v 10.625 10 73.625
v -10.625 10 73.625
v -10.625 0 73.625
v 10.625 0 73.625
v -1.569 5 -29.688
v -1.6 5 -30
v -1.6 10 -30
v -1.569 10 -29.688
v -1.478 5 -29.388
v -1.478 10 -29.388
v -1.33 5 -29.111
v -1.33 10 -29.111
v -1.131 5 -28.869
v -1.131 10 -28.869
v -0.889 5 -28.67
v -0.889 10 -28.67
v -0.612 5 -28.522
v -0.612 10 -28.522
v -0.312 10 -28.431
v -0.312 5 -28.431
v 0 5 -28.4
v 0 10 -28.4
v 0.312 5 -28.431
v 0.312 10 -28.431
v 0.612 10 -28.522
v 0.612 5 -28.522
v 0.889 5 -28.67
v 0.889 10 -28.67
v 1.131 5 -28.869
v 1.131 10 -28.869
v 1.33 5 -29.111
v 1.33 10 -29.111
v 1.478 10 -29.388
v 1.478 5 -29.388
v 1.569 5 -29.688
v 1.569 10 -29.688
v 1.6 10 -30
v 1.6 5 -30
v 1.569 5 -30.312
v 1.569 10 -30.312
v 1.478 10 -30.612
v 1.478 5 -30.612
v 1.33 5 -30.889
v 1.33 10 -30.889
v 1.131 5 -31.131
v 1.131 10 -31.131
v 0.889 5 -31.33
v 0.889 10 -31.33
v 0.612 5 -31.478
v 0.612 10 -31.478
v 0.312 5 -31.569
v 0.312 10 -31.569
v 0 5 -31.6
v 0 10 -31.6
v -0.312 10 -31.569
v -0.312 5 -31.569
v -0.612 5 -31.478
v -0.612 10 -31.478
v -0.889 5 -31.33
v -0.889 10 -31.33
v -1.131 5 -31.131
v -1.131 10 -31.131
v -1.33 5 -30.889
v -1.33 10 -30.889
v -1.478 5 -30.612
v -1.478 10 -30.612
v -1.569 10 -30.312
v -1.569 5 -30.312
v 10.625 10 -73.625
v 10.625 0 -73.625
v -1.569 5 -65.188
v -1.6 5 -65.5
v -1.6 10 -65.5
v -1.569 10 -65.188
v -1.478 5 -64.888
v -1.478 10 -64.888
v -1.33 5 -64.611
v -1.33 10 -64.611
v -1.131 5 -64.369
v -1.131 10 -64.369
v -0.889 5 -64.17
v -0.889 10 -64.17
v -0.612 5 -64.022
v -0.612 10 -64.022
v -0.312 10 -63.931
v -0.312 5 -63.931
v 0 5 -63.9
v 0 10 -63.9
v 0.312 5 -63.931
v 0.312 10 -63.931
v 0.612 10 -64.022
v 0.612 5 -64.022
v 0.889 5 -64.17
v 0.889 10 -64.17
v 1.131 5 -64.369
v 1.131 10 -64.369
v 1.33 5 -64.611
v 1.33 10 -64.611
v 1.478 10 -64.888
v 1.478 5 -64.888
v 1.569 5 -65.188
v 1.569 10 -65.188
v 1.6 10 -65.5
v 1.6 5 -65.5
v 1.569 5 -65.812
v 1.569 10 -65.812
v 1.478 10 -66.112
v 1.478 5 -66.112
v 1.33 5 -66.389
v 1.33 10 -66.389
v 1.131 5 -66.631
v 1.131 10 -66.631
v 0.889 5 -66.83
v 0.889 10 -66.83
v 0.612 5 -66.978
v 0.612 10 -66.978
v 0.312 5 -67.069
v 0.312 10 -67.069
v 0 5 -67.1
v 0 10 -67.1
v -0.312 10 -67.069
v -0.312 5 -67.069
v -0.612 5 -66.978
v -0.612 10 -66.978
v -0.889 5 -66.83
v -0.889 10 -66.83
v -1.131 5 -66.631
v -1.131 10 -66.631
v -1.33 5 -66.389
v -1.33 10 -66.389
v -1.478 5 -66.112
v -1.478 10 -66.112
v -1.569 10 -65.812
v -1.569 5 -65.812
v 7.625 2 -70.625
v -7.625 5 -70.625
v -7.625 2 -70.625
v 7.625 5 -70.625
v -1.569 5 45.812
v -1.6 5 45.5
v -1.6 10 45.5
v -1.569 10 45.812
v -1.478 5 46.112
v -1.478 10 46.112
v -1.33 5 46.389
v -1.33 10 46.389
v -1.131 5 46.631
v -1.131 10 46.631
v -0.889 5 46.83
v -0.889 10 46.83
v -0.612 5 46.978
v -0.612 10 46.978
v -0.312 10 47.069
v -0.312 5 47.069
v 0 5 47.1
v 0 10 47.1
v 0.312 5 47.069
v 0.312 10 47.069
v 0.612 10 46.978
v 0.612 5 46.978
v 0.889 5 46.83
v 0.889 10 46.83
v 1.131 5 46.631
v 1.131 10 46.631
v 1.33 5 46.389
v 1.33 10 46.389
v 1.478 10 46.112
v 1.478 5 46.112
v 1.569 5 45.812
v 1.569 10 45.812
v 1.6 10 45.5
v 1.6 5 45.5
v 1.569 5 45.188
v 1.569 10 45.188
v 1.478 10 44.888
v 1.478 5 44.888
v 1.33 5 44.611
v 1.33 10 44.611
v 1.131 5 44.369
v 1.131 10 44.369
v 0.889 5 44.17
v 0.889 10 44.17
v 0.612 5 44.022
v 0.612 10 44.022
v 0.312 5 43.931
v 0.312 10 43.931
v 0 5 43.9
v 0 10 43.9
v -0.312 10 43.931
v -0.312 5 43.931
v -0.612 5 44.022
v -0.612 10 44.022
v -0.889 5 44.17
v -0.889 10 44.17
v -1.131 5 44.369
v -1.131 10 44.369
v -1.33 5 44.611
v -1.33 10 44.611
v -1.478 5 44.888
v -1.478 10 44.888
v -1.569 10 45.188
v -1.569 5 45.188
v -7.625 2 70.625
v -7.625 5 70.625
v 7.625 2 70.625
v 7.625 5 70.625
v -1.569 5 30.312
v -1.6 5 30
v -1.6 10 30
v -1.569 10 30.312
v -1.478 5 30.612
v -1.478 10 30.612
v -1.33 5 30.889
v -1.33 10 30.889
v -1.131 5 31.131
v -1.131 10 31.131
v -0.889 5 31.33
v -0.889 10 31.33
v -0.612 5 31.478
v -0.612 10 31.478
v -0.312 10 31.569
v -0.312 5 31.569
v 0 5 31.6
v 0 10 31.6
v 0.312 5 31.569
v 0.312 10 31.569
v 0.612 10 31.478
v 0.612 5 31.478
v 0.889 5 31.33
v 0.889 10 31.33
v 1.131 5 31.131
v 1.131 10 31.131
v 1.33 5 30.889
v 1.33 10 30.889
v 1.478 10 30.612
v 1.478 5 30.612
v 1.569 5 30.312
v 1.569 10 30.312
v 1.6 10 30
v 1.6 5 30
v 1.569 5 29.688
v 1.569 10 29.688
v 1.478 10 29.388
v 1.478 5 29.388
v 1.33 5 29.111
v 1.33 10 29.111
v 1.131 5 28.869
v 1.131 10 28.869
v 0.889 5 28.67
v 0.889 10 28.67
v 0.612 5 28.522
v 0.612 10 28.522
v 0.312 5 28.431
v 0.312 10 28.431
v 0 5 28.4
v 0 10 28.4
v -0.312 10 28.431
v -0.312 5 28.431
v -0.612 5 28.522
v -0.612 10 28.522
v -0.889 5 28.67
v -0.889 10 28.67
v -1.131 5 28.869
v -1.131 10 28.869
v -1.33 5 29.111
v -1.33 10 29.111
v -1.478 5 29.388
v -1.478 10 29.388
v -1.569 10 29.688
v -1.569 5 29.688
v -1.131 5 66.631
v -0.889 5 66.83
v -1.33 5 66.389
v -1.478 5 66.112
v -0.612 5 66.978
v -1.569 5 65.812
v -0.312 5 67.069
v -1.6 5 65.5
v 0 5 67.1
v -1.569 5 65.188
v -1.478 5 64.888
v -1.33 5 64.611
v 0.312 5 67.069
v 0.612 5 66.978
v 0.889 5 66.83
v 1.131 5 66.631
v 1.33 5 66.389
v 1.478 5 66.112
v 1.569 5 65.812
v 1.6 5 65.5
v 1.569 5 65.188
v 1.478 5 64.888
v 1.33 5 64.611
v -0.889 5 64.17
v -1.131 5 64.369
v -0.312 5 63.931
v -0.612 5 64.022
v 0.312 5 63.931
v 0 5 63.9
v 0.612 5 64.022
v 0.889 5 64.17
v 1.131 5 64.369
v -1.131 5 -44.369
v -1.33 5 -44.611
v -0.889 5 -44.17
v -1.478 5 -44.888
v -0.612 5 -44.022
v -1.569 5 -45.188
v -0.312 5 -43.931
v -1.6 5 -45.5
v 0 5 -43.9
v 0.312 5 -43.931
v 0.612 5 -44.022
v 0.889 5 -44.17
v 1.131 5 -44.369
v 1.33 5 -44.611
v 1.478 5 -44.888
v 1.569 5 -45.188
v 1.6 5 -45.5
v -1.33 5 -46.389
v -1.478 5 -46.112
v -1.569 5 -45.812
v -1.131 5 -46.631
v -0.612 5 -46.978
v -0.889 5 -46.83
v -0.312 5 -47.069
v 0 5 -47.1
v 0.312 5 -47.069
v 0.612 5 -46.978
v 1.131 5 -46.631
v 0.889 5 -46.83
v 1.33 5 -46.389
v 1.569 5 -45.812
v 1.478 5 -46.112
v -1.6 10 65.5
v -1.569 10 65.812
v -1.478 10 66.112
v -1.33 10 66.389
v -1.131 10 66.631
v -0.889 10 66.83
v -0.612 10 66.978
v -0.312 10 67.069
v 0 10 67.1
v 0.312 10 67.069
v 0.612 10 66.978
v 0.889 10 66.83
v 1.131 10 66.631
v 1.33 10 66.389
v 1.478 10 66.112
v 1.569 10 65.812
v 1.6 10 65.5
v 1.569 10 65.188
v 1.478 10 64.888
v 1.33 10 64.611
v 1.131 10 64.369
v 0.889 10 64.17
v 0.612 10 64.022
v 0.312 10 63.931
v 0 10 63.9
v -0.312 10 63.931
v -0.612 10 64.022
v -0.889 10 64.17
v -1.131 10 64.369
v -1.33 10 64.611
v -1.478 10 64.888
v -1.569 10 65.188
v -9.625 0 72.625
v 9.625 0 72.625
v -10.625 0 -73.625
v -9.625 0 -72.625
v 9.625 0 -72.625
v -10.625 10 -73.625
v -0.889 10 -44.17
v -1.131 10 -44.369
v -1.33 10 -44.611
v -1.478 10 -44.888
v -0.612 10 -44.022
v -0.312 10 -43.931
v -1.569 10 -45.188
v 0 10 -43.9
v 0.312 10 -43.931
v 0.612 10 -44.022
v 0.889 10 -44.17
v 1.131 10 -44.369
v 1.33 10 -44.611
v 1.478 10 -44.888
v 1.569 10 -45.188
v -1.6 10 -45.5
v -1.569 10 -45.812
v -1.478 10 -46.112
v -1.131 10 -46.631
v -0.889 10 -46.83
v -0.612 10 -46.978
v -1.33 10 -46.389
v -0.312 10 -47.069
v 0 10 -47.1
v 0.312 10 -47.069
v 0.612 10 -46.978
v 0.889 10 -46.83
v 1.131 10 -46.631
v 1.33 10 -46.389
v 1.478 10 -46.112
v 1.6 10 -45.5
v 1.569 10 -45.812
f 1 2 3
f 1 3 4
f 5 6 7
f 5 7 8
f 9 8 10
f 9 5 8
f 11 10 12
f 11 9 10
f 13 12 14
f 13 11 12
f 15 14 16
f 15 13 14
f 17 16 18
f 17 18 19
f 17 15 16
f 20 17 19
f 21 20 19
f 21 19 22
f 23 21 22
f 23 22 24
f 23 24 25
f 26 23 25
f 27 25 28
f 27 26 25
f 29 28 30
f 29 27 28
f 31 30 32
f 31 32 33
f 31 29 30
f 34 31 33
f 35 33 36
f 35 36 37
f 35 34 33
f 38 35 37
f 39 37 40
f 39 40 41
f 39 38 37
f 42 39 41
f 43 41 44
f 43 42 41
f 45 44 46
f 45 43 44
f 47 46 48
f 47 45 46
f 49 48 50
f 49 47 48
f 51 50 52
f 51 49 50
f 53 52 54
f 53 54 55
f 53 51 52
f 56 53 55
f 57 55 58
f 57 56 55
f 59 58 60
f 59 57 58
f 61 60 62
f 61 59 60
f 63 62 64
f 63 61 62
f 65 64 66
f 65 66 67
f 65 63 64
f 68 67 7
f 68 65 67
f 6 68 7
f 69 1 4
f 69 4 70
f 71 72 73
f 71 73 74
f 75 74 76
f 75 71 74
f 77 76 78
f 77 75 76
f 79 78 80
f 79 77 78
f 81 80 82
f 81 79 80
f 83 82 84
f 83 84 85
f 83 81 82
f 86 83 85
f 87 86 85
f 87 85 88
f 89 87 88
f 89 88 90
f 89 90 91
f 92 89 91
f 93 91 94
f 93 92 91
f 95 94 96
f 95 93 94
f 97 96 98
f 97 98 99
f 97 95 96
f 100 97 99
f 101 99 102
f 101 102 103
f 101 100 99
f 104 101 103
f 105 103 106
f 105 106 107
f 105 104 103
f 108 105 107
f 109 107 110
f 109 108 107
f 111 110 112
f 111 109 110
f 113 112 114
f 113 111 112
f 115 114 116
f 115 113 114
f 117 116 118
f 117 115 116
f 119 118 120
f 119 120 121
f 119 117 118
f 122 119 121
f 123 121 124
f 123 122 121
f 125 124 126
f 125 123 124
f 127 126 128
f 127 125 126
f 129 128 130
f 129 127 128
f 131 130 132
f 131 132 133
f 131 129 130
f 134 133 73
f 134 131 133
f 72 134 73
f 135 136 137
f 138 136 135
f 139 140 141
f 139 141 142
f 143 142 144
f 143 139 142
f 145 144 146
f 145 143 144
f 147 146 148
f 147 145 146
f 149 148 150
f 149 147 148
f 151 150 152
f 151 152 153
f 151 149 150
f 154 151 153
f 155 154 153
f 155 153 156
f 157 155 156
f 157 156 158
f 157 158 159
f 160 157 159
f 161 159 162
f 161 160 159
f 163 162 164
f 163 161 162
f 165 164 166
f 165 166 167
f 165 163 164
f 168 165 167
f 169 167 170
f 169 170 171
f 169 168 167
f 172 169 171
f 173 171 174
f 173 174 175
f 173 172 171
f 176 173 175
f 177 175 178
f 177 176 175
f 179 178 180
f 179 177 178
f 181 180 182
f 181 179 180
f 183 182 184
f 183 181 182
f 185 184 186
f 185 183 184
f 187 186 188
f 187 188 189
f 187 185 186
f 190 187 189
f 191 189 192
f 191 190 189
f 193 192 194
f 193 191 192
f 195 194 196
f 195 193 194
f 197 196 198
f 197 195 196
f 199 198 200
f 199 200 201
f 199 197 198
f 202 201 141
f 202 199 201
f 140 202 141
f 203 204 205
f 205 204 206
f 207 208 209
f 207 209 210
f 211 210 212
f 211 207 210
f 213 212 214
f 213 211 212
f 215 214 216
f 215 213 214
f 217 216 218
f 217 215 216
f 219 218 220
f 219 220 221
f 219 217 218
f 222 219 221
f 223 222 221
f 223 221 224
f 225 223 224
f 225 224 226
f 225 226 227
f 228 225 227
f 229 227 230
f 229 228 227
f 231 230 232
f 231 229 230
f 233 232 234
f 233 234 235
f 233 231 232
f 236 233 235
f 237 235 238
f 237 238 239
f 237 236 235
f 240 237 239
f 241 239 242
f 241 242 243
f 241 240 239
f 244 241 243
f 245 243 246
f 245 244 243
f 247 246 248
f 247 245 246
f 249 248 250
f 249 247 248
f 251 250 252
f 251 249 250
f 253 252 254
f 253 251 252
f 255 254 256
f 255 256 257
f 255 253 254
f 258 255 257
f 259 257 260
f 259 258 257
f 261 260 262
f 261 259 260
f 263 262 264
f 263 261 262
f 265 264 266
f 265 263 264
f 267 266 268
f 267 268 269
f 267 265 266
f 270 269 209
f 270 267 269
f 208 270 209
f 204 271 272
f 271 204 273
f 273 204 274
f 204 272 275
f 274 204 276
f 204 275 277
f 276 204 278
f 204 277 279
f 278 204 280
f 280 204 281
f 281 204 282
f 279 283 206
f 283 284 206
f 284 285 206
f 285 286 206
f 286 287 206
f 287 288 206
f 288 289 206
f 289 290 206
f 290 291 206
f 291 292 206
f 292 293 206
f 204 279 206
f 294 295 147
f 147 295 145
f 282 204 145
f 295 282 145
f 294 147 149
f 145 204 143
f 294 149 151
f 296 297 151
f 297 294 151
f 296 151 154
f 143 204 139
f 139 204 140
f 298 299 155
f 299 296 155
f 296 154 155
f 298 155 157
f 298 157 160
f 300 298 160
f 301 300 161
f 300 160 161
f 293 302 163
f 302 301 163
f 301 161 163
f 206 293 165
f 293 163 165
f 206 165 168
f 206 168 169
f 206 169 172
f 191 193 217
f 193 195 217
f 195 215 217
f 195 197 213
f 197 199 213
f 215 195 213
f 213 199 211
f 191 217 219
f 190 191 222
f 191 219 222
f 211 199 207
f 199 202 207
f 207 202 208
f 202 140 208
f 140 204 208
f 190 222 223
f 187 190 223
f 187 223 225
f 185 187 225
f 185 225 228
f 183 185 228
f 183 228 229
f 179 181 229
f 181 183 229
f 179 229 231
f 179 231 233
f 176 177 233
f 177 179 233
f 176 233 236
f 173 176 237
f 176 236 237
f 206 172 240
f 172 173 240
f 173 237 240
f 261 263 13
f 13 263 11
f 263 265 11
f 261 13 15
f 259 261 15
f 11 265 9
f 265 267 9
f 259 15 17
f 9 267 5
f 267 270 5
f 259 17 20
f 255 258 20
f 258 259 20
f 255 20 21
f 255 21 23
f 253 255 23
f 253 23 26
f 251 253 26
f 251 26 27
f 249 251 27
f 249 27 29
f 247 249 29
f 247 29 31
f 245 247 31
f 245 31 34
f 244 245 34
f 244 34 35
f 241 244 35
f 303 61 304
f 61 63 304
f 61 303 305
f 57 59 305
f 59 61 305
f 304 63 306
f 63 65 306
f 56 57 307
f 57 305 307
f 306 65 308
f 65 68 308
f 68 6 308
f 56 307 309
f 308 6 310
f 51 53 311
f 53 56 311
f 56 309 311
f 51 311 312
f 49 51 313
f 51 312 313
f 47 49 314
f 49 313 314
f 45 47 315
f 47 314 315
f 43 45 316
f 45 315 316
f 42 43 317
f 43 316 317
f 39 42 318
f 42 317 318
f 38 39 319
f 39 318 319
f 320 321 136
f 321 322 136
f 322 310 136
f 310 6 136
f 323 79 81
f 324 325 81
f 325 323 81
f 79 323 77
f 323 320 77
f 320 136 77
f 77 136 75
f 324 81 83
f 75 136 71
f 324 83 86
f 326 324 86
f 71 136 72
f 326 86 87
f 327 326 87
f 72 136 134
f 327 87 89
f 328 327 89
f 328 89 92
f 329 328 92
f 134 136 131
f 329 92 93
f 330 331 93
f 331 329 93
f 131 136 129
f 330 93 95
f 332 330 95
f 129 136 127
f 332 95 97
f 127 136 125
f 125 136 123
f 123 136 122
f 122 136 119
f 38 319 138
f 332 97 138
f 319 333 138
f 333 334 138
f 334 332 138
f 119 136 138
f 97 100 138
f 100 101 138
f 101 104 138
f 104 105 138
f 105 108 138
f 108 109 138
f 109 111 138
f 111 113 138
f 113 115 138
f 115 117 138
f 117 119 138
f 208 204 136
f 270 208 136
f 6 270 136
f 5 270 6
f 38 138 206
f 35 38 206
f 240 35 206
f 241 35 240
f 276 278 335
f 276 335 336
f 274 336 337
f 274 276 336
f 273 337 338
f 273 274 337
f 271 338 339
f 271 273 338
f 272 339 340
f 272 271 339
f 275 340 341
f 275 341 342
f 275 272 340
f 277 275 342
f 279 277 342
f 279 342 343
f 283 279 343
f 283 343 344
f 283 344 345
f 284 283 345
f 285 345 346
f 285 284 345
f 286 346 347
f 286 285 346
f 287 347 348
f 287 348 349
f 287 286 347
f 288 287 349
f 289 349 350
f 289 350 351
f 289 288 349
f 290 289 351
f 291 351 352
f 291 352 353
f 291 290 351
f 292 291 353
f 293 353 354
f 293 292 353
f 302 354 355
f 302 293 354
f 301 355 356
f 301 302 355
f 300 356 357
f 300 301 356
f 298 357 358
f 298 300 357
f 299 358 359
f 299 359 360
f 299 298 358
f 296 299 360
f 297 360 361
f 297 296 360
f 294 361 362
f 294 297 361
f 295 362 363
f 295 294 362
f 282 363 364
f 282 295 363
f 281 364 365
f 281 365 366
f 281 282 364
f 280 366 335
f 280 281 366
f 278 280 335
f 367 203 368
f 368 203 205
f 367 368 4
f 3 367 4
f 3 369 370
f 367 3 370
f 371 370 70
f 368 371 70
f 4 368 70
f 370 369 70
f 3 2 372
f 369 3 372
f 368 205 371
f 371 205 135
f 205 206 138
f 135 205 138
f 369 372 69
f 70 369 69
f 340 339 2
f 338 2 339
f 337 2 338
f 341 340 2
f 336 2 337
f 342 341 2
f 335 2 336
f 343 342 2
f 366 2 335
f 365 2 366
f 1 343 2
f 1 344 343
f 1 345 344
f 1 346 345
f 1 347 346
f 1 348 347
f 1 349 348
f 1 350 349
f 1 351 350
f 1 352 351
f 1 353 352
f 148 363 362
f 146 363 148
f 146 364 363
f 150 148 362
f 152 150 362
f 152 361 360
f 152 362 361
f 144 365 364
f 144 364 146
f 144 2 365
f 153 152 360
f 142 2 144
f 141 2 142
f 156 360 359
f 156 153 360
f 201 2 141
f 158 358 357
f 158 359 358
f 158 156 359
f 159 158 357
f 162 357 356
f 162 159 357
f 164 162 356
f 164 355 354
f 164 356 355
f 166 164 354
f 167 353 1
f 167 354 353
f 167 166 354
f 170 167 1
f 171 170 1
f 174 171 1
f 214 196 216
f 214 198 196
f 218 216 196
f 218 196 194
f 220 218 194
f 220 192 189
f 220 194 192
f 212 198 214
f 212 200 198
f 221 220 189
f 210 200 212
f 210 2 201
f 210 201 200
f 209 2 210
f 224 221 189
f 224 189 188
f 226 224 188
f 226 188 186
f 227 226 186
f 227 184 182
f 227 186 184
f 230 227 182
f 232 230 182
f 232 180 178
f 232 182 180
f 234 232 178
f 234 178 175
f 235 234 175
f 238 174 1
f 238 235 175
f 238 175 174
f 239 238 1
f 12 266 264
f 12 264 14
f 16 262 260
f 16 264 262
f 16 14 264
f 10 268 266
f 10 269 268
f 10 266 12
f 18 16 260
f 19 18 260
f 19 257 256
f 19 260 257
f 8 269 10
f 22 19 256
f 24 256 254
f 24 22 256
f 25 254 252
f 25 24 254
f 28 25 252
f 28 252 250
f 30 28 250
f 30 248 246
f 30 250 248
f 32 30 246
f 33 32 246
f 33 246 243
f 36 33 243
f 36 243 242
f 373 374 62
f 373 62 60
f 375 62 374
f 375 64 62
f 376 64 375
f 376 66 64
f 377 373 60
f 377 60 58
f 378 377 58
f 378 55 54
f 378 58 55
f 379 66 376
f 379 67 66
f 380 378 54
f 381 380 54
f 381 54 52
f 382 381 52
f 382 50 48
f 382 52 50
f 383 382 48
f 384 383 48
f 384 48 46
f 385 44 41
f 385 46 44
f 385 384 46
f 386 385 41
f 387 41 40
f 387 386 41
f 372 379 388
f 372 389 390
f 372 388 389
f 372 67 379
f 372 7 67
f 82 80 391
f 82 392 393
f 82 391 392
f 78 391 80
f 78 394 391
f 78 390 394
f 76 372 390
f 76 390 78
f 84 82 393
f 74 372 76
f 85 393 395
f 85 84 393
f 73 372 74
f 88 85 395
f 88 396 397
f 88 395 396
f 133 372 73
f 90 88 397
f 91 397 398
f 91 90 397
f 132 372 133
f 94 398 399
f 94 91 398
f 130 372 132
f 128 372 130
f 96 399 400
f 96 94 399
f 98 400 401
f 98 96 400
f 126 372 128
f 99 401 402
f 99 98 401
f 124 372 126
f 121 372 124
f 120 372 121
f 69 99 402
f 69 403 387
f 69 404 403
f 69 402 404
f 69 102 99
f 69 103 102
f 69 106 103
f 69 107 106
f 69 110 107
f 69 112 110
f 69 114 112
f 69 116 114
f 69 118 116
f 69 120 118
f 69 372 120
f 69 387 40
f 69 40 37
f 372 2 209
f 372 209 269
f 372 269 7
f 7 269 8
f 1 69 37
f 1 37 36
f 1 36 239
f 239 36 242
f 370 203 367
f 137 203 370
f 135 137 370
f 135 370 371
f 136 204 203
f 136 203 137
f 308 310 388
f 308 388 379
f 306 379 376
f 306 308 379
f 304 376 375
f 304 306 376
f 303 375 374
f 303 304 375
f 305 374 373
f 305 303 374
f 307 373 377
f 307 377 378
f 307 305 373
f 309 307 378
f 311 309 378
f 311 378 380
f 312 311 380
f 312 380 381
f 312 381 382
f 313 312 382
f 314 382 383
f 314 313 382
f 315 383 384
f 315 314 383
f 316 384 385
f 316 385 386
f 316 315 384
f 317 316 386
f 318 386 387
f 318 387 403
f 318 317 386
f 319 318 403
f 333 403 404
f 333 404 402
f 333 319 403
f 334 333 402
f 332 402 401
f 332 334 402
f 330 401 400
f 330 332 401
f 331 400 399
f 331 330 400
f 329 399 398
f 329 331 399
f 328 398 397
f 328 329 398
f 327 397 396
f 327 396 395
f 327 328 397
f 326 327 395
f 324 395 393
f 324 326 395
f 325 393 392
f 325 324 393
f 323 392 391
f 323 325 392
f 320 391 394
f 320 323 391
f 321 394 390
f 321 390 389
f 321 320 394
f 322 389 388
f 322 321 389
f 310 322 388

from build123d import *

# Parameters (mm, degrees)
SKETCH_1_W      = 15.25
SKETCH_1_H      = 141.25
SKETCH_1_R      = 1.6
EXTRUDE_1_DEPTH = 5
SKETCH_2_W      = 21.25
SKETCH_2_H      = 147.25
SKETCH_2_W_2    = 15.25
SKETCH_2_H_2    = 141.25
EXTRUDE_2_DEPTH = 10
CHAMFER_1_SIZE  = 2


with BuildPart() as part:
    # ｽｹｯﾁ1 → ﾎﾞｽ - 押し出し1 (new body)
    with BuildSketch(Plane(origin=(0, 5, 0), x_dir=(1, 0, 0), z_dir=(0, 1, 0))):
        Rectangle(SKETCH_1_W, SKETCH_1_H)
        with Locations(Location((0, -30, 0), (0, 0, 180))):
            Circle(SKETCH_1_R, mode=Mode.SUBTRACT)
        with Locations(Location((0, 65.5, 0), (0, 0, 180))):
            Circle(SKETCH_1_R, mode=Mode.SUBTRACT)
        with Locations(Location((0, 45.5, 0), (0, 0, 180))):
            Circle(SKETCH_1_R, mode=Mode.SUBTRACT)
        with Locations(Location((0, -45.5, 0), (0, 0, 180))):
            Circle(SKETCH_1_R, mode=Mode.SUBTRACT)
        with Locations(Location((0, 30, 0), (0, 0, 180))):
            Circle(SKETCH_1_R, mode=Mode.SUBTRACT)
        with Locations(Location((0, -65.5, 0), (0, 0, 180))):
            Circle(SKETCH_1_R, mode=Mode.SUBTRACT)
    extrude(amount=EXTRUDE_1_DEPTH)

    # ｽｹｯﾁ2 → ﾎﾞｽ - 押し出し2 (add)
    with BuildSketch(Plane(origin=(0, 10, 0), x_dir=(1, 0, 0), z_dir=(0, 1, 0))):
        Rectangle(SKETCH_2_W, SKETCH_2_H)
        Rectangle(SKETCH_2_W_2, SKETCH_2_H_2, mode=Mode.SUBTRACT)
    extrude(amount=-EXTRUDE_2_DEPTH)

    # 面取り1
    chamfer_1_edges = [part.edges().sort_by_distance(p)[0] for p in [
        (-7.625, 0, 0),
        (0, 0, 70.625),
        (7.625, 0, 0),
        (0, 0, -70.625),
    ]]
    chamfer(chamfer_1_edges, length=CHAMFER_1_SIZE)


solid = part.part
